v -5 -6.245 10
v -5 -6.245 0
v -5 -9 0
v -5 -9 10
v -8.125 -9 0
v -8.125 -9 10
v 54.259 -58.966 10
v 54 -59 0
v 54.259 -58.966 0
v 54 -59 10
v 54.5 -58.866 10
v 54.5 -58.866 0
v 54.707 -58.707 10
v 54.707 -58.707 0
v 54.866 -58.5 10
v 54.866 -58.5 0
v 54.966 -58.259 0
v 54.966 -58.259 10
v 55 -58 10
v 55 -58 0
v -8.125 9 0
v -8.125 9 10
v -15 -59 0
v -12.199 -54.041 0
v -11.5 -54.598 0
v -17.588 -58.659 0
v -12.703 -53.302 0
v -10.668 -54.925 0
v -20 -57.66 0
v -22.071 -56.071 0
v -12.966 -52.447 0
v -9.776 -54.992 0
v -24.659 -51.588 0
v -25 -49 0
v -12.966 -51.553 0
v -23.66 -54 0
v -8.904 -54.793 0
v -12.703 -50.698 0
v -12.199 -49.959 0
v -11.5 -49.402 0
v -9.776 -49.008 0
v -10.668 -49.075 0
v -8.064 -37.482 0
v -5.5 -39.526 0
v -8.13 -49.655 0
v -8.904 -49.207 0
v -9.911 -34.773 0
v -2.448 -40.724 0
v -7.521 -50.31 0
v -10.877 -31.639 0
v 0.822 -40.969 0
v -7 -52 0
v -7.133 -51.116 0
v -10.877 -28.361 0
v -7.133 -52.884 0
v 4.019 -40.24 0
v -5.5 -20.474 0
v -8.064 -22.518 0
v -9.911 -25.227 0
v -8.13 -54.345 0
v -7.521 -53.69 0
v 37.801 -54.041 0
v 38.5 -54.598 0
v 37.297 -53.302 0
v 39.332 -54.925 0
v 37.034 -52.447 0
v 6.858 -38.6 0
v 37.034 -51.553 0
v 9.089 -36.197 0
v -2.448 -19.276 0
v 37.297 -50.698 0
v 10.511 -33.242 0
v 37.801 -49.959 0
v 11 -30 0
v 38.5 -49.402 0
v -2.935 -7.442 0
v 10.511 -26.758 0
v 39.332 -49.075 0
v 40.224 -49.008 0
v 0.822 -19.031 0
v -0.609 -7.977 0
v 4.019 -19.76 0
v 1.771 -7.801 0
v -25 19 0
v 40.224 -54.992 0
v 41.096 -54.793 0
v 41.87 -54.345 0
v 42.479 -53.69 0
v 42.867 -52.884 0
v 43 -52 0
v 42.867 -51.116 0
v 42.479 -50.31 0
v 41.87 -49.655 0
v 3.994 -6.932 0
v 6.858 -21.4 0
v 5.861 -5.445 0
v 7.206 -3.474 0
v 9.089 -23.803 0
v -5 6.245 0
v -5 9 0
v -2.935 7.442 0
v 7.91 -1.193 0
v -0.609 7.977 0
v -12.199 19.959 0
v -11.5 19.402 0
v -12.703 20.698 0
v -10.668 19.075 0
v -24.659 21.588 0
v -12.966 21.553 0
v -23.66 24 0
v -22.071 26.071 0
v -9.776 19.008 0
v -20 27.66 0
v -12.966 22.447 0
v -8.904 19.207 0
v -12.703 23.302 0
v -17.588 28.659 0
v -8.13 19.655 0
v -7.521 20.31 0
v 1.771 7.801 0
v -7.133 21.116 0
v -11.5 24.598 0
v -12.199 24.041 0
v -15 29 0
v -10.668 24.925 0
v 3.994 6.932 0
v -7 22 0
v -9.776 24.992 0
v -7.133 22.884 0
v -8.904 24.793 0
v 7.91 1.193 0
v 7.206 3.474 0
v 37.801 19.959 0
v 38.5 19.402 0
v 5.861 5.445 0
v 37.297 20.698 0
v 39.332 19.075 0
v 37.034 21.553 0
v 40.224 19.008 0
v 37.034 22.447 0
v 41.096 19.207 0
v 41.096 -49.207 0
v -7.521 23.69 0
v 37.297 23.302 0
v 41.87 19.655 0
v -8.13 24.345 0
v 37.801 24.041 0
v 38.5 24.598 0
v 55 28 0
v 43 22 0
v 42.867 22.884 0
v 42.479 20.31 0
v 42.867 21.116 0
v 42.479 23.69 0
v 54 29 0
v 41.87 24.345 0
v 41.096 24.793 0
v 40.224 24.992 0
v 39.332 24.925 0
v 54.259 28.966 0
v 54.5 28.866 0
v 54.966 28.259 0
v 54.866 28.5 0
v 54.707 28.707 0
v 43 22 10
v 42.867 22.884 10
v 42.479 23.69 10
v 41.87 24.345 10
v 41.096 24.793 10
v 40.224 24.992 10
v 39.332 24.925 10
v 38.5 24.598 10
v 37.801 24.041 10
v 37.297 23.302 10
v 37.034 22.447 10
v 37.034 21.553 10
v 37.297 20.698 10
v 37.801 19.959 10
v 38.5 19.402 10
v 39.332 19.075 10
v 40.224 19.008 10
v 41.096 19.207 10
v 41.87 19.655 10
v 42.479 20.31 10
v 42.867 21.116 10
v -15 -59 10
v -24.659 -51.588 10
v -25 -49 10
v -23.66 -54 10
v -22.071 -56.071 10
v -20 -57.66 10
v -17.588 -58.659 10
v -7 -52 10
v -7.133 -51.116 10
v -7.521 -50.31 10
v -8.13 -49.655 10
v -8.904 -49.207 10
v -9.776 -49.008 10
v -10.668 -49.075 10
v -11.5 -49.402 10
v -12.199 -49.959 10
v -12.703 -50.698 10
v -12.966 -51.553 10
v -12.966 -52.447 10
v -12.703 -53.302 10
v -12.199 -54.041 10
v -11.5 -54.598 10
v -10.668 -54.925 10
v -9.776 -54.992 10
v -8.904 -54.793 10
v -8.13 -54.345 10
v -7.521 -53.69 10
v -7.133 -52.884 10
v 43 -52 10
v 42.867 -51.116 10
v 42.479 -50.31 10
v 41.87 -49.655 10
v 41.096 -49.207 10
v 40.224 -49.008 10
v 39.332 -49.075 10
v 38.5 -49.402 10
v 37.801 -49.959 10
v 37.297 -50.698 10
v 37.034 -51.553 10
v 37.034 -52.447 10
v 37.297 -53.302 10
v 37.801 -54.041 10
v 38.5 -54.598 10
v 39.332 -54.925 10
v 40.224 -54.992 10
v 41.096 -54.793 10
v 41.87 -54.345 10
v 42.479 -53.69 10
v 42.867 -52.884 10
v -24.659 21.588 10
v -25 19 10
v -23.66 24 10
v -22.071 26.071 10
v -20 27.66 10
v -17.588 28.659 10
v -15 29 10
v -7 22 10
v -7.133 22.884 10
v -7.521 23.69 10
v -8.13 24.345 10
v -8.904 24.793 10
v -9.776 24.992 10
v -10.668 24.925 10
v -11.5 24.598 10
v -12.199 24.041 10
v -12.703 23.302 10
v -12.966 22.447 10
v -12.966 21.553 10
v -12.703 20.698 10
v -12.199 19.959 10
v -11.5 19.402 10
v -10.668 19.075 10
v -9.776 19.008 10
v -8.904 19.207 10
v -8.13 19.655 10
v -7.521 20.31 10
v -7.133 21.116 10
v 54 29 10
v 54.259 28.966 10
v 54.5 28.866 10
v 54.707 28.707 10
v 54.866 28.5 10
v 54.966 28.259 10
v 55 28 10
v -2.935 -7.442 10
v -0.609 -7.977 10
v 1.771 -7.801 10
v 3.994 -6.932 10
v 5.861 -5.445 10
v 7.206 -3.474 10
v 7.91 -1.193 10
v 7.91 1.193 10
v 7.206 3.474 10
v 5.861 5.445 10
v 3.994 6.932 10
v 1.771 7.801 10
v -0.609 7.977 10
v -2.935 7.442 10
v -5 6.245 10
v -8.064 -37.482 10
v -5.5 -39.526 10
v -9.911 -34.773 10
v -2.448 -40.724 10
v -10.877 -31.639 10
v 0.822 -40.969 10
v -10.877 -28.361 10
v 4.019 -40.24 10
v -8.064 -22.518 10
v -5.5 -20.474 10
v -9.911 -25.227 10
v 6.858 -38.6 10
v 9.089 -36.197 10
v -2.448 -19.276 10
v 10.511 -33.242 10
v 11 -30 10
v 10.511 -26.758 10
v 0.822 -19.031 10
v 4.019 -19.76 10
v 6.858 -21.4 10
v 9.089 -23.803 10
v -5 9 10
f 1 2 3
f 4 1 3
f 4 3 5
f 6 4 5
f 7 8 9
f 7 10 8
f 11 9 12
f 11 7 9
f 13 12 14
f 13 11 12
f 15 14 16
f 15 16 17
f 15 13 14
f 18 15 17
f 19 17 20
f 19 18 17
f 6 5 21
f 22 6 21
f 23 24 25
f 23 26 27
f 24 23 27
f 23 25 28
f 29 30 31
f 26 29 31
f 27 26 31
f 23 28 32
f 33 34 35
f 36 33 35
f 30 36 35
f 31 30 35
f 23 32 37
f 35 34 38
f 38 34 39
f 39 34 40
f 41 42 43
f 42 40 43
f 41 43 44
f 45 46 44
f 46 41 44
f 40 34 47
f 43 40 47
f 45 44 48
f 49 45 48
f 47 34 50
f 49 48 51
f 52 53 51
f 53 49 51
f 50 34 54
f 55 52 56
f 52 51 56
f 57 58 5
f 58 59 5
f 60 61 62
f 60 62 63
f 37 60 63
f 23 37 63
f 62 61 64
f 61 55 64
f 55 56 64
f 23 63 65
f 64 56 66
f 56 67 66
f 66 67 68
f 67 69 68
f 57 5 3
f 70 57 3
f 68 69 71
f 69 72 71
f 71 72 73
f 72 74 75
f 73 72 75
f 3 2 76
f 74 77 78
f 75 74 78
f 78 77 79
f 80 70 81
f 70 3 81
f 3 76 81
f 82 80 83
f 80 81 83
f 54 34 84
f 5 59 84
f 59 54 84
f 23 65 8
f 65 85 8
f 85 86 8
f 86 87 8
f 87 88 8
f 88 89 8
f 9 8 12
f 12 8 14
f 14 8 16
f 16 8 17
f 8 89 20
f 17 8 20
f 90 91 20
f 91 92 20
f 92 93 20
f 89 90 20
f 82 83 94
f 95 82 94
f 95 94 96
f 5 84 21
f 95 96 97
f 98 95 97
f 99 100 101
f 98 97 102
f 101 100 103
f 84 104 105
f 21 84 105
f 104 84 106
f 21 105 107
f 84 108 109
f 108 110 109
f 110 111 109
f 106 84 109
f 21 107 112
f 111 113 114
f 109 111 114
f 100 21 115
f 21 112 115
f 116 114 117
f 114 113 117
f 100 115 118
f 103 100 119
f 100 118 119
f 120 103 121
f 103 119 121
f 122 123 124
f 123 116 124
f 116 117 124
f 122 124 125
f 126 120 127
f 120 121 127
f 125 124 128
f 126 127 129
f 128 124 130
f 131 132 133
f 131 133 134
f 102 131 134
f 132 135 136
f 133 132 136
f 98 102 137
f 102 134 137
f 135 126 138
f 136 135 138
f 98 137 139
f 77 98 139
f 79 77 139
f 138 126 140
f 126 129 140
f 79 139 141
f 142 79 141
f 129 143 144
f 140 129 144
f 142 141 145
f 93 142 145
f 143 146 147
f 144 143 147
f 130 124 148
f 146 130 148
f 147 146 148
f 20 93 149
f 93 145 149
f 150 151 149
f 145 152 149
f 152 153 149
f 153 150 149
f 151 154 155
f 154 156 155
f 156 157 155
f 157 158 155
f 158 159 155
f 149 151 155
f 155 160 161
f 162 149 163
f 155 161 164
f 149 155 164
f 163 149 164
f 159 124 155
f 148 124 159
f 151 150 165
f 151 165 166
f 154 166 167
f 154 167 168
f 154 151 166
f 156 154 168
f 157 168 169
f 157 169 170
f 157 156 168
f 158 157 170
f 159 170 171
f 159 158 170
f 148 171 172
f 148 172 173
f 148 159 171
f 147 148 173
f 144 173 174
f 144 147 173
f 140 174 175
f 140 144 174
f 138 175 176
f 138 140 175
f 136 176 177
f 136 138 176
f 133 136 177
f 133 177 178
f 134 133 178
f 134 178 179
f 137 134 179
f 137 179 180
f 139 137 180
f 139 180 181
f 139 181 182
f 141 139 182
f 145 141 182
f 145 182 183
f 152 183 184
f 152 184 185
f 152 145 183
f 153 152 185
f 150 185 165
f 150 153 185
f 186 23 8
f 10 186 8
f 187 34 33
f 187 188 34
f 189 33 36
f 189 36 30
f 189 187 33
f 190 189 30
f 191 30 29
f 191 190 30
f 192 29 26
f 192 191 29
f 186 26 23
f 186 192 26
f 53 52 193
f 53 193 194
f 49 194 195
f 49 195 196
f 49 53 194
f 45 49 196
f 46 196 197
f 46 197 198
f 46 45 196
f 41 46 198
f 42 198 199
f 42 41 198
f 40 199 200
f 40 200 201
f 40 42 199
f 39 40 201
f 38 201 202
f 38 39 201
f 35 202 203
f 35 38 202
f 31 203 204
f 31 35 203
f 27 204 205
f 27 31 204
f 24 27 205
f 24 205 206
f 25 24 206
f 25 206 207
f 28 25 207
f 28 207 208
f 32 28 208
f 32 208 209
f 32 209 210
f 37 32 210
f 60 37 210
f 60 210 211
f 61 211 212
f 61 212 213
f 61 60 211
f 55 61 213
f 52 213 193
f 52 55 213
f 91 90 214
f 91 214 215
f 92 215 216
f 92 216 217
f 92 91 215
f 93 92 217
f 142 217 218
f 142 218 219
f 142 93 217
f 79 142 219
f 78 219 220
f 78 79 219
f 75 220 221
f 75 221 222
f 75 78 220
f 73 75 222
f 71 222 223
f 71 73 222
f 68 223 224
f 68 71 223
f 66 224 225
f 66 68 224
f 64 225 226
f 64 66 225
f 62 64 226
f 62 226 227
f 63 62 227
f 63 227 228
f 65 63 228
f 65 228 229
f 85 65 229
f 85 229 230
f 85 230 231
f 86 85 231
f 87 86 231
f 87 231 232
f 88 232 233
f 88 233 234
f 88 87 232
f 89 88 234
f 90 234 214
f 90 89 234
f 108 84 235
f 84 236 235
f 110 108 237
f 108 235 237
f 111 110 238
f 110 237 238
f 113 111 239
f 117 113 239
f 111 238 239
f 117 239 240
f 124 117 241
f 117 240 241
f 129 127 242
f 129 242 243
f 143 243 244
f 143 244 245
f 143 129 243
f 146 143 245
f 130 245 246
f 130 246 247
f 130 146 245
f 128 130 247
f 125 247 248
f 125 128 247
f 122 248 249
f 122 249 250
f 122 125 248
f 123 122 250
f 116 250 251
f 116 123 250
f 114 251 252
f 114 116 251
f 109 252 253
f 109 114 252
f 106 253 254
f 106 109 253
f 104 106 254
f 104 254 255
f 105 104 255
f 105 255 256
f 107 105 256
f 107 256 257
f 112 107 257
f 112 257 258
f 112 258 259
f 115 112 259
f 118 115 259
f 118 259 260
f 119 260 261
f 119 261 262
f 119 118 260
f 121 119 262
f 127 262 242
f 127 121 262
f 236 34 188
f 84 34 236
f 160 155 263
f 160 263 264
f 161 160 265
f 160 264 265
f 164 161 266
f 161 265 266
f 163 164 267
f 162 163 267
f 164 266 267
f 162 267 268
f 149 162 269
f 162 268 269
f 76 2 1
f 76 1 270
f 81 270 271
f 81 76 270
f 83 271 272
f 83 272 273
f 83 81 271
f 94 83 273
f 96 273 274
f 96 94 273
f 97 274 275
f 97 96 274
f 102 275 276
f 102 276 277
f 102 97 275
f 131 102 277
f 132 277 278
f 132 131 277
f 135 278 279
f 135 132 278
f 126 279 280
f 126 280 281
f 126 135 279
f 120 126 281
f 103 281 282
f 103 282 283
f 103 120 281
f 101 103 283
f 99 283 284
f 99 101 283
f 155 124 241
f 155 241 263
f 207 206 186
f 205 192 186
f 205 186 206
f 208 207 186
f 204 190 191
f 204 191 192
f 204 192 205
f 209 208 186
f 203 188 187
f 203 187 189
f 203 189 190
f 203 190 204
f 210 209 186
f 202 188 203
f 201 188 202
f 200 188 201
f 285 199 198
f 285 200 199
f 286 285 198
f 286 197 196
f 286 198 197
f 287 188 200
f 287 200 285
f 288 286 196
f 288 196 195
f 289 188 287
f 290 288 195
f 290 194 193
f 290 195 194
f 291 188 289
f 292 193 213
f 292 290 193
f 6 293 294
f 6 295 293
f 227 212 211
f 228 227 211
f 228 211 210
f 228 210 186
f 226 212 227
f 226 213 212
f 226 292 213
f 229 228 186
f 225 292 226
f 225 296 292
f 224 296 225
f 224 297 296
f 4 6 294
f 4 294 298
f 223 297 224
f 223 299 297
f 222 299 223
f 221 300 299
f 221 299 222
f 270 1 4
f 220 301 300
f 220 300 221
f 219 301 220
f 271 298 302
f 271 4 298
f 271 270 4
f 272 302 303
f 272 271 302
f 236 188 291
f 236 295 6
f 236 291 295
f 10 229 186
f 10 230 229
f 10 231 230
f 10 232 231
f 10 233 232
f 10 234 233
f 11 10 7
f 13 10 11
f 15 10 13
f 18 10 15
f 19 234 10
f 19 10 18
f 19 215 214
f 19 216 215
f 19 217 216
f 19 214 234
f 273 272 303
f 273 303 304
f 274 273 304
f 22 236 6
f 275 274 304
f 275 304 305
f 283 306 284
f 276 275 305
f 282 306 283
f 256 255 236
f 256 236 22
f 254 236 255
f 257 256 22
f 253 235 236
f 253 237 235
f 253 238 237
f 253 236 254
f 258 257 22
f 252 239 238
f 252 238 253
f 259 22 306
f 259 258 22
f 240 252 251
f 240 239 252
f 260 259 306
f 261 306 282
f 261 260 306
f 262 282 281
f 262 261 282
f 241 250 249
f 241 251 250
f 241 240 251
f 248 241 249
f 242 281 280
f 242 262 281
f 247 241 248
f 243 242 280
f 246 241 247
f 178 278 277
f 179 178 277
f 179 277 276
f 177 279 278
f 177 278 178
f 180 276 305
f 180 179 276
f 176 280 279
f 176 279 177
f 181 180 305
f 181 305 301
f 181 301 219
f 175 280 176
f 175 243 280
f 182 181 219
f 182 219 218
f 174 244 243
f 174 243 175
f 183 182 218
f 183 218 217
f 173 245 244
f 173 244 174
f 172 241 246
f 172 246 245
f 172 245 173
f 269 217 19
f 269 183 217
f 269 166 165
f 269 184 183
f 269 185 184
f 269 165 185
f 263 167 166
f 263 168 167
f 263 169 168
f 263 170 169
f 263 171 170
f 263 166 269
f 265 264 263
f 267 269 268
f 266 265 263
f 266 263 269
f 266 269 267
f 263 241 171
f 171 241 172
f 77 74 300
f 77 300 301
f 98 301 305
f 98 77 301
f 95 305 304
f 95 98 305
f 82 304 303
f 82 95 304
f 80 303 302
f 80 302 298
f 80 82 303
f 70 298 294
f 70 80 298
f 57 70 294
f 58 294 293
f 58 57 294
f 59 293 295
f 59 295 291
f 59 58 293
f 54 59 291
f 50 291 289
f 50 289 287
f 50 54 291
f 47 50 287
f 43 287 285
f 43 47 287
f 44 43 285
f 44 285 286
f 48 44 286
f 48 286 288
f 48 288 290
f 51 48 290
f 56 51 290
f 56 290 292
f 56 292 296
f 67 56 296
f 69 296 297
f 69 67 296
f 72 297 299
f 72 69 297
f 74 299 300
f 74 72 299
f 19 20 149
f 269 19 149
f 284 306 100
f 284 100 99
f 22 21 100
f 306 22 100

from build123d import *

# Parameters (mm, degrees)
SKETCH_W    = 80
SKETCH_H    = 88
SKETCH_R    = 11
SKETCH_R_2  = 3
PAD_DEPTH   = 10
FILLET_R    = 10
FILLET001_R = 1


with BuildPart() as part:
    # Sketch → Pad (new body)
    with BuildSketch(Plane.XY):
        with Locations((15, -15)):
            Rectangle(SKETCH_W, SKETCH_H)
        with Locations((0, -30)):
            Circle(SKETCH_R, mode=Mode.SUBTRACT)
        with Locations((-10, -52)):
            Circle(SKETCH_R_2, mode=Mode.SUBTRACT)
        with Locations((40, -52)):
            Circle(SKETCH_R_2, mode=Mode.SUBTRACT)
        with Locations((40, 22)):
            Circle(SKETCH_R_2, mode=Mode.SUBTRACT)
        with Locations((-10, 22)):
            Circle(SKETCH_R_2, mode=Mode.SUBTRACT)
        with BuildLine():
            ThreePointArc((-5, -6.244998), (8, 0), (-5, 6.244998))
            Line((-5, 9), (-5, 6.244998))
            Line((-8.125, 9), (-5, 9))
            Line((-8.125, -9), (-8.125, 9))
            Line((-5, -9), (-8.125, -9))
            Line((-5, -6.244998), (-5, -9))
        make_face(mode=Mode.SUBTRACT)
    extrude(amount=PAD_DEPTH)

    # Fillet
    fillet_edges = [part.edges().sort_by_distance(p)[0] for p in [
        (-25, 29, 5),
        (-25, -59, 5),
    ]]
    fillet(fillet_edges, radius=FILLET_R)

    # Fillet001
    fillet001_edges = [part.edges().sort_by_distance(p)[0] for p in [
        (55, -59, 5),
        (55, 29, 5),
    ]]
    fillet(fillet001_edges, radius=FILLET001_R)


solid = part.part
